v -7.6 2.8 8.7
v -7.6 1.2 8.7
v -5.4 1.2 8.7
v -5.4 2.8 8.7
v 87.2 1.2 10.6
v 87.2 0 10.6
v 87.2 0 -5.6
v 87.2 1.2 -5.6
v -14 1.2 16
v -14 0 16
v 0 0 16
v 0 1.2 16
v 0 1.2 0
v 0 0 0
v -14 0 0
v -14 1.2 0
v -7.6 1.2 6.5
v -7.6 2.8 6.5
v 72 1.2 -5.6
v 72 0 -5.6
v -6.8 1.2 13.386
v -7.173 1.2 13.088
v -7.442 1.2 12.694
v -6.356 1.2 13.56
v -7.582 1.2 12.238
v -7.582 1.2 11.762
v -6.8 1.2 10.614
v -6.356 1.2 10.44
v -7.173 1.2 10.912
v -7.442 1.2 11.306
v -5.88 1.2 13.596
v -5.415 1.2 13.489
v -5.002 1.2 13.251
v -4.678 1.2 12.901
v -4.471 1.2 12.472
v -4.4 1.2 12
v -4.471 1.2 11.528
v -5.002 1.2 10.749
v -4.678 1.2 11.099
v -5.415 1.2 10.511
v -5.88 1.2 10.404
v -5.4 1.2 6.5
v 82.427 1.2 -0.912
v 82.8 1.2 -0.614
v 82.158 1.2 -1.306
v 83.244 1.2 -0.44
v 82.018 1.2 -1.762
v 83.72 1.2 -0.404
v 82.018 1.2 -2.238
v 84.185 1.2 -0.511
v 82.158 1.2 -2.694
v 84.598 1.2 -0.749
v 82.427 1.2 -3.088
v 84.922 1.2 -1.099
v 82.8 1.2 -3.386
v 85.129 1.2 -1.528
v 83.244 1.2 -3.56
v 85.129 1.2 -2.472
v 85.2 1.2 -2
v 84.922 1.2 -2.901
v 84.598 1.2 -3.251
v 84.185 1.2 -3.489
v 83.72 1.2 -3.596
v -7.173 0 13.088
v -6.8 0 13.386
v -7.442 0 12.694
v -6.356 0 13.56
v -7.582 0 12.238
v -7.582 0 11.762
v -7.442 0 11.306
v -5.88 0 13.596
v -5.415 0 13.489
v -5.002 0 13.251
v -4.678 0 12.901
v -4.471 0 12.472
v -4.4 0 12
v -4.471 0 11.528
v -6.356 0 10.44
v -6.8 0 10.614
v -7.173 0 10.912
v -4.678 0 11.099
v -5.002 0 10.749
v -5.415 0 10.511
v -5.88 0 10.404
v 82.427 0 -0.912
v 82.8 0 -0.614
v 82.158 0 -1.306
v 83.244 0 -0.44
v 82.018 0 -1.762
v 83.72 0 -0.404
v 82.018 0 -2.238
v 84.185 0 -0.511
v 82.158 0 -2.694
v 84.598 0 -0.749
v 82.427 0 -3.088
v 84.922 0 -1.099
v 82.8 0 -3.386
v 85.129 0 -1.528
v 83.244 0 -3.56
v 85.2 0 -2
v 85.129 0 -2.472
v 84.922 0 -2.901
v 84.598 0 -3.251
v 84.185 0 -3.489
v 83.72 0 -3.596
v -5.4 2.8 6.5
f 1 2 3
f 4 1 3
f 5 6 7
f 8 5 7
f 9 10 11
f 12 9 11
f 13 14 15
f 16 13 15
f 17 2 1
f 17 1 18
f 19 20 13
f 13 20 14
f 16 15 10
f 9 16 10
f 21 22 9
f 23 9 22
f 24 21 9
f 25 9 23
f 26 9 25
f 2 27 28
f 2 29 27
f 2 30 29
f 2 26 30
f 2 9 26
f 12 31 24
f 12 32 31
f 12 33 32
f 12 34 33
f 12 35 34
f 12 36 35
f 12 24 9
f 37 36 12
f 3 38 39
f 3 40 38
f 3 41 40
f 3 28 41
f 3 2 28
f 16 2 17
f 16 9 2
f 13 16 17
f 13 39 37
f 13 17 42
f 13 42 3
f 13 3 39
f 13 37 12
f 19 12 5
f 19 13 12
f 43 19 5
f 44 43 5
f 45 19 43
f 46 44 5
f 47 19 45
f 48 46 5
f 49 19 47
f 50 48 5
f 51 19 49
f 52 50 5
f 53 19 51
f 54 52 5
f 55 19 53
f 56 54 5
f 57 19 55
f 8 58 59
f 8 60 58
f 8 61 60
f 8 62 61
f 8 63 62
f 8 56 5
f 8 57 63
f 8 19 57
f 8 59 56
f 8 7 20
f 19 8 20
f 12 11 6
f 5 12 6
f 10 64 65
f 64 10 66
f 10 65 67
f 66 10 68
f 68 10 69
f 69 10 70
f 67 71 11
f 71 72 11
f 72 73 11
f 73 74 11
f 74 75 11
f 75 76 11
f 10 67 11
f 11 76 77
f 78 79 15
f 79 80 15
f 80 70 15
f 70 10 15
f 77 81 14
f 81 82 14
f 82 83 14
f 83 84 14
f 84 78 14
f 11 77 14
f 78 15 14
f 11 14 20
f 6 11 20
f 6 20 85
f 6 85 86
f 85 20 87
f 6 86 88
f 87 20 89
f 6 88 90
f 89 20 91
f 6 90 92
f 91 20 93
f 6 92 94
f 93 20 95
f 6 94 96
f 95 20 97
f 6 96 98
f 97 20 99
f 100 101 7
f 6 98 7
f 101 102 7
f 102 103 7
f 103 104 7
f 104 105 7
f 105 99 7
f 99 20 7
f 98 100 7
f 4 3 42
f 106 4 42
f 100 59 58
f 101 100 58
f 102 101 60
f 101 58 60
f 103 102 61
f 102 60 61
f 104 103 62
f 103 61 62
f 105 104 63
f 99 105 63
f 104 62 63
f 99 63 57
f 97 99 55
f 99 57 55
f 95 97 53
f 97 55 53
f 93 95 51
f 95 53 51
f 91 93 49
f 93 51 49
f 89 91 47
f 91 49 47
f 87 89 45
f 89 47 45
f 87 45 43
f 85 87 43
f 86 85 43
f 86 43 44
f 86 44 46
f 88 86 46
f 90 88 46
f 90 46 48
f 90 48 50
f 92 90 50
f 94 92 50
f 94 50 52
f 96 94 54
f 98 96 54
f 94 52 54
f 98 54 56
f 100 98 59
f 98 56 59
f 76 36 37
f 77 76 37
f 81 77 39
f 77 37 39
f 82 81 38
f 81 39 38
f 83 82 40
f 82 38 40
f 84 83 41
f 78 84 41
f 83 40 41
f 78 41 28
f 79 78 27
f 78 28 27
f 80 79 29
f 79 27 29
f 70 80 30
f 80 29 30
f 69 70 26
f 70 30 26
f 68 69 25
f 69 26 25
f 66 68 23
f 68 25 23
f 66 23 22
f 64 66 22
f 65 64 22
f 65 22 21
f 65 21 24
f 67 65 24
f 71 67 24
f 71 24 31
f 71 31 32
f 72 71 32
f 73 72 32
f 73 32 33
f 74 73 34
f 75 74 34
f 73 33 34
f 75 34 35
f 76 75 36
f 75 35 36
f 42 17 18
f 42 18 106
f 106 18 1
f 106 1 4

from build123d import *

# Parameters (mm, degrees)
BOSS_EXTRUDE1_DEPTH = 1.2
SKETCH2_R           = 1.6
CUT_EXTRUDE1_DEPTH  = 1.2
SKETCH3_W           = 2.2
SKETCH3_H           = 2.2
BOSS_EXTRUDE2_DEPTH = 1.6


with BuildPart() as part:
    # Sketch1 → Boss-Extrude1 (new body)
    with BuildSketch(Plane(origin=(0, 0, 0), x_dir=(1, 0, 0), z_dir=(0, 1, 0))):
        Polygon((87.2, 5.6), (72, 5.6), (0, 0), (-14, 0), (-14, -16), (0, -16), (87.2, -10.6), align=None)
    extrude(amount=BOSS_EXTRUDE1_DEPTH)

    # Sketch2 → Cut-Extrude1 (cut)
    with BuildSketch(Plane(origin=(0, 1.2, 0), x_dir=(1, 0, 0), z_dir=(0, 1, 0))):
        with Locations((-6, -12)):
            Circle(SKETCH2_R)
        with Locations((83.6, 2)):
            Circle(SKETCH2_R)
    extrude(amount=-CUT_EXTRUDE1_DEPTH, mode=Mode.SUBTRACT)

    # Sketch3 → Boss-Extrude2 (add)
    with BuildSketch(Plane(origin=(0, 1.2, 0), x_dir=(1, 0, 0), z_dir=(0, 1, 0))):
        with Locations((-6.5, -7.6)):
            Rectangle(SKETCH3_W, SKETCH3_H)
    extrude(amount=BOSS_EXTRUDE2_DEPTH)


solid = part.part
